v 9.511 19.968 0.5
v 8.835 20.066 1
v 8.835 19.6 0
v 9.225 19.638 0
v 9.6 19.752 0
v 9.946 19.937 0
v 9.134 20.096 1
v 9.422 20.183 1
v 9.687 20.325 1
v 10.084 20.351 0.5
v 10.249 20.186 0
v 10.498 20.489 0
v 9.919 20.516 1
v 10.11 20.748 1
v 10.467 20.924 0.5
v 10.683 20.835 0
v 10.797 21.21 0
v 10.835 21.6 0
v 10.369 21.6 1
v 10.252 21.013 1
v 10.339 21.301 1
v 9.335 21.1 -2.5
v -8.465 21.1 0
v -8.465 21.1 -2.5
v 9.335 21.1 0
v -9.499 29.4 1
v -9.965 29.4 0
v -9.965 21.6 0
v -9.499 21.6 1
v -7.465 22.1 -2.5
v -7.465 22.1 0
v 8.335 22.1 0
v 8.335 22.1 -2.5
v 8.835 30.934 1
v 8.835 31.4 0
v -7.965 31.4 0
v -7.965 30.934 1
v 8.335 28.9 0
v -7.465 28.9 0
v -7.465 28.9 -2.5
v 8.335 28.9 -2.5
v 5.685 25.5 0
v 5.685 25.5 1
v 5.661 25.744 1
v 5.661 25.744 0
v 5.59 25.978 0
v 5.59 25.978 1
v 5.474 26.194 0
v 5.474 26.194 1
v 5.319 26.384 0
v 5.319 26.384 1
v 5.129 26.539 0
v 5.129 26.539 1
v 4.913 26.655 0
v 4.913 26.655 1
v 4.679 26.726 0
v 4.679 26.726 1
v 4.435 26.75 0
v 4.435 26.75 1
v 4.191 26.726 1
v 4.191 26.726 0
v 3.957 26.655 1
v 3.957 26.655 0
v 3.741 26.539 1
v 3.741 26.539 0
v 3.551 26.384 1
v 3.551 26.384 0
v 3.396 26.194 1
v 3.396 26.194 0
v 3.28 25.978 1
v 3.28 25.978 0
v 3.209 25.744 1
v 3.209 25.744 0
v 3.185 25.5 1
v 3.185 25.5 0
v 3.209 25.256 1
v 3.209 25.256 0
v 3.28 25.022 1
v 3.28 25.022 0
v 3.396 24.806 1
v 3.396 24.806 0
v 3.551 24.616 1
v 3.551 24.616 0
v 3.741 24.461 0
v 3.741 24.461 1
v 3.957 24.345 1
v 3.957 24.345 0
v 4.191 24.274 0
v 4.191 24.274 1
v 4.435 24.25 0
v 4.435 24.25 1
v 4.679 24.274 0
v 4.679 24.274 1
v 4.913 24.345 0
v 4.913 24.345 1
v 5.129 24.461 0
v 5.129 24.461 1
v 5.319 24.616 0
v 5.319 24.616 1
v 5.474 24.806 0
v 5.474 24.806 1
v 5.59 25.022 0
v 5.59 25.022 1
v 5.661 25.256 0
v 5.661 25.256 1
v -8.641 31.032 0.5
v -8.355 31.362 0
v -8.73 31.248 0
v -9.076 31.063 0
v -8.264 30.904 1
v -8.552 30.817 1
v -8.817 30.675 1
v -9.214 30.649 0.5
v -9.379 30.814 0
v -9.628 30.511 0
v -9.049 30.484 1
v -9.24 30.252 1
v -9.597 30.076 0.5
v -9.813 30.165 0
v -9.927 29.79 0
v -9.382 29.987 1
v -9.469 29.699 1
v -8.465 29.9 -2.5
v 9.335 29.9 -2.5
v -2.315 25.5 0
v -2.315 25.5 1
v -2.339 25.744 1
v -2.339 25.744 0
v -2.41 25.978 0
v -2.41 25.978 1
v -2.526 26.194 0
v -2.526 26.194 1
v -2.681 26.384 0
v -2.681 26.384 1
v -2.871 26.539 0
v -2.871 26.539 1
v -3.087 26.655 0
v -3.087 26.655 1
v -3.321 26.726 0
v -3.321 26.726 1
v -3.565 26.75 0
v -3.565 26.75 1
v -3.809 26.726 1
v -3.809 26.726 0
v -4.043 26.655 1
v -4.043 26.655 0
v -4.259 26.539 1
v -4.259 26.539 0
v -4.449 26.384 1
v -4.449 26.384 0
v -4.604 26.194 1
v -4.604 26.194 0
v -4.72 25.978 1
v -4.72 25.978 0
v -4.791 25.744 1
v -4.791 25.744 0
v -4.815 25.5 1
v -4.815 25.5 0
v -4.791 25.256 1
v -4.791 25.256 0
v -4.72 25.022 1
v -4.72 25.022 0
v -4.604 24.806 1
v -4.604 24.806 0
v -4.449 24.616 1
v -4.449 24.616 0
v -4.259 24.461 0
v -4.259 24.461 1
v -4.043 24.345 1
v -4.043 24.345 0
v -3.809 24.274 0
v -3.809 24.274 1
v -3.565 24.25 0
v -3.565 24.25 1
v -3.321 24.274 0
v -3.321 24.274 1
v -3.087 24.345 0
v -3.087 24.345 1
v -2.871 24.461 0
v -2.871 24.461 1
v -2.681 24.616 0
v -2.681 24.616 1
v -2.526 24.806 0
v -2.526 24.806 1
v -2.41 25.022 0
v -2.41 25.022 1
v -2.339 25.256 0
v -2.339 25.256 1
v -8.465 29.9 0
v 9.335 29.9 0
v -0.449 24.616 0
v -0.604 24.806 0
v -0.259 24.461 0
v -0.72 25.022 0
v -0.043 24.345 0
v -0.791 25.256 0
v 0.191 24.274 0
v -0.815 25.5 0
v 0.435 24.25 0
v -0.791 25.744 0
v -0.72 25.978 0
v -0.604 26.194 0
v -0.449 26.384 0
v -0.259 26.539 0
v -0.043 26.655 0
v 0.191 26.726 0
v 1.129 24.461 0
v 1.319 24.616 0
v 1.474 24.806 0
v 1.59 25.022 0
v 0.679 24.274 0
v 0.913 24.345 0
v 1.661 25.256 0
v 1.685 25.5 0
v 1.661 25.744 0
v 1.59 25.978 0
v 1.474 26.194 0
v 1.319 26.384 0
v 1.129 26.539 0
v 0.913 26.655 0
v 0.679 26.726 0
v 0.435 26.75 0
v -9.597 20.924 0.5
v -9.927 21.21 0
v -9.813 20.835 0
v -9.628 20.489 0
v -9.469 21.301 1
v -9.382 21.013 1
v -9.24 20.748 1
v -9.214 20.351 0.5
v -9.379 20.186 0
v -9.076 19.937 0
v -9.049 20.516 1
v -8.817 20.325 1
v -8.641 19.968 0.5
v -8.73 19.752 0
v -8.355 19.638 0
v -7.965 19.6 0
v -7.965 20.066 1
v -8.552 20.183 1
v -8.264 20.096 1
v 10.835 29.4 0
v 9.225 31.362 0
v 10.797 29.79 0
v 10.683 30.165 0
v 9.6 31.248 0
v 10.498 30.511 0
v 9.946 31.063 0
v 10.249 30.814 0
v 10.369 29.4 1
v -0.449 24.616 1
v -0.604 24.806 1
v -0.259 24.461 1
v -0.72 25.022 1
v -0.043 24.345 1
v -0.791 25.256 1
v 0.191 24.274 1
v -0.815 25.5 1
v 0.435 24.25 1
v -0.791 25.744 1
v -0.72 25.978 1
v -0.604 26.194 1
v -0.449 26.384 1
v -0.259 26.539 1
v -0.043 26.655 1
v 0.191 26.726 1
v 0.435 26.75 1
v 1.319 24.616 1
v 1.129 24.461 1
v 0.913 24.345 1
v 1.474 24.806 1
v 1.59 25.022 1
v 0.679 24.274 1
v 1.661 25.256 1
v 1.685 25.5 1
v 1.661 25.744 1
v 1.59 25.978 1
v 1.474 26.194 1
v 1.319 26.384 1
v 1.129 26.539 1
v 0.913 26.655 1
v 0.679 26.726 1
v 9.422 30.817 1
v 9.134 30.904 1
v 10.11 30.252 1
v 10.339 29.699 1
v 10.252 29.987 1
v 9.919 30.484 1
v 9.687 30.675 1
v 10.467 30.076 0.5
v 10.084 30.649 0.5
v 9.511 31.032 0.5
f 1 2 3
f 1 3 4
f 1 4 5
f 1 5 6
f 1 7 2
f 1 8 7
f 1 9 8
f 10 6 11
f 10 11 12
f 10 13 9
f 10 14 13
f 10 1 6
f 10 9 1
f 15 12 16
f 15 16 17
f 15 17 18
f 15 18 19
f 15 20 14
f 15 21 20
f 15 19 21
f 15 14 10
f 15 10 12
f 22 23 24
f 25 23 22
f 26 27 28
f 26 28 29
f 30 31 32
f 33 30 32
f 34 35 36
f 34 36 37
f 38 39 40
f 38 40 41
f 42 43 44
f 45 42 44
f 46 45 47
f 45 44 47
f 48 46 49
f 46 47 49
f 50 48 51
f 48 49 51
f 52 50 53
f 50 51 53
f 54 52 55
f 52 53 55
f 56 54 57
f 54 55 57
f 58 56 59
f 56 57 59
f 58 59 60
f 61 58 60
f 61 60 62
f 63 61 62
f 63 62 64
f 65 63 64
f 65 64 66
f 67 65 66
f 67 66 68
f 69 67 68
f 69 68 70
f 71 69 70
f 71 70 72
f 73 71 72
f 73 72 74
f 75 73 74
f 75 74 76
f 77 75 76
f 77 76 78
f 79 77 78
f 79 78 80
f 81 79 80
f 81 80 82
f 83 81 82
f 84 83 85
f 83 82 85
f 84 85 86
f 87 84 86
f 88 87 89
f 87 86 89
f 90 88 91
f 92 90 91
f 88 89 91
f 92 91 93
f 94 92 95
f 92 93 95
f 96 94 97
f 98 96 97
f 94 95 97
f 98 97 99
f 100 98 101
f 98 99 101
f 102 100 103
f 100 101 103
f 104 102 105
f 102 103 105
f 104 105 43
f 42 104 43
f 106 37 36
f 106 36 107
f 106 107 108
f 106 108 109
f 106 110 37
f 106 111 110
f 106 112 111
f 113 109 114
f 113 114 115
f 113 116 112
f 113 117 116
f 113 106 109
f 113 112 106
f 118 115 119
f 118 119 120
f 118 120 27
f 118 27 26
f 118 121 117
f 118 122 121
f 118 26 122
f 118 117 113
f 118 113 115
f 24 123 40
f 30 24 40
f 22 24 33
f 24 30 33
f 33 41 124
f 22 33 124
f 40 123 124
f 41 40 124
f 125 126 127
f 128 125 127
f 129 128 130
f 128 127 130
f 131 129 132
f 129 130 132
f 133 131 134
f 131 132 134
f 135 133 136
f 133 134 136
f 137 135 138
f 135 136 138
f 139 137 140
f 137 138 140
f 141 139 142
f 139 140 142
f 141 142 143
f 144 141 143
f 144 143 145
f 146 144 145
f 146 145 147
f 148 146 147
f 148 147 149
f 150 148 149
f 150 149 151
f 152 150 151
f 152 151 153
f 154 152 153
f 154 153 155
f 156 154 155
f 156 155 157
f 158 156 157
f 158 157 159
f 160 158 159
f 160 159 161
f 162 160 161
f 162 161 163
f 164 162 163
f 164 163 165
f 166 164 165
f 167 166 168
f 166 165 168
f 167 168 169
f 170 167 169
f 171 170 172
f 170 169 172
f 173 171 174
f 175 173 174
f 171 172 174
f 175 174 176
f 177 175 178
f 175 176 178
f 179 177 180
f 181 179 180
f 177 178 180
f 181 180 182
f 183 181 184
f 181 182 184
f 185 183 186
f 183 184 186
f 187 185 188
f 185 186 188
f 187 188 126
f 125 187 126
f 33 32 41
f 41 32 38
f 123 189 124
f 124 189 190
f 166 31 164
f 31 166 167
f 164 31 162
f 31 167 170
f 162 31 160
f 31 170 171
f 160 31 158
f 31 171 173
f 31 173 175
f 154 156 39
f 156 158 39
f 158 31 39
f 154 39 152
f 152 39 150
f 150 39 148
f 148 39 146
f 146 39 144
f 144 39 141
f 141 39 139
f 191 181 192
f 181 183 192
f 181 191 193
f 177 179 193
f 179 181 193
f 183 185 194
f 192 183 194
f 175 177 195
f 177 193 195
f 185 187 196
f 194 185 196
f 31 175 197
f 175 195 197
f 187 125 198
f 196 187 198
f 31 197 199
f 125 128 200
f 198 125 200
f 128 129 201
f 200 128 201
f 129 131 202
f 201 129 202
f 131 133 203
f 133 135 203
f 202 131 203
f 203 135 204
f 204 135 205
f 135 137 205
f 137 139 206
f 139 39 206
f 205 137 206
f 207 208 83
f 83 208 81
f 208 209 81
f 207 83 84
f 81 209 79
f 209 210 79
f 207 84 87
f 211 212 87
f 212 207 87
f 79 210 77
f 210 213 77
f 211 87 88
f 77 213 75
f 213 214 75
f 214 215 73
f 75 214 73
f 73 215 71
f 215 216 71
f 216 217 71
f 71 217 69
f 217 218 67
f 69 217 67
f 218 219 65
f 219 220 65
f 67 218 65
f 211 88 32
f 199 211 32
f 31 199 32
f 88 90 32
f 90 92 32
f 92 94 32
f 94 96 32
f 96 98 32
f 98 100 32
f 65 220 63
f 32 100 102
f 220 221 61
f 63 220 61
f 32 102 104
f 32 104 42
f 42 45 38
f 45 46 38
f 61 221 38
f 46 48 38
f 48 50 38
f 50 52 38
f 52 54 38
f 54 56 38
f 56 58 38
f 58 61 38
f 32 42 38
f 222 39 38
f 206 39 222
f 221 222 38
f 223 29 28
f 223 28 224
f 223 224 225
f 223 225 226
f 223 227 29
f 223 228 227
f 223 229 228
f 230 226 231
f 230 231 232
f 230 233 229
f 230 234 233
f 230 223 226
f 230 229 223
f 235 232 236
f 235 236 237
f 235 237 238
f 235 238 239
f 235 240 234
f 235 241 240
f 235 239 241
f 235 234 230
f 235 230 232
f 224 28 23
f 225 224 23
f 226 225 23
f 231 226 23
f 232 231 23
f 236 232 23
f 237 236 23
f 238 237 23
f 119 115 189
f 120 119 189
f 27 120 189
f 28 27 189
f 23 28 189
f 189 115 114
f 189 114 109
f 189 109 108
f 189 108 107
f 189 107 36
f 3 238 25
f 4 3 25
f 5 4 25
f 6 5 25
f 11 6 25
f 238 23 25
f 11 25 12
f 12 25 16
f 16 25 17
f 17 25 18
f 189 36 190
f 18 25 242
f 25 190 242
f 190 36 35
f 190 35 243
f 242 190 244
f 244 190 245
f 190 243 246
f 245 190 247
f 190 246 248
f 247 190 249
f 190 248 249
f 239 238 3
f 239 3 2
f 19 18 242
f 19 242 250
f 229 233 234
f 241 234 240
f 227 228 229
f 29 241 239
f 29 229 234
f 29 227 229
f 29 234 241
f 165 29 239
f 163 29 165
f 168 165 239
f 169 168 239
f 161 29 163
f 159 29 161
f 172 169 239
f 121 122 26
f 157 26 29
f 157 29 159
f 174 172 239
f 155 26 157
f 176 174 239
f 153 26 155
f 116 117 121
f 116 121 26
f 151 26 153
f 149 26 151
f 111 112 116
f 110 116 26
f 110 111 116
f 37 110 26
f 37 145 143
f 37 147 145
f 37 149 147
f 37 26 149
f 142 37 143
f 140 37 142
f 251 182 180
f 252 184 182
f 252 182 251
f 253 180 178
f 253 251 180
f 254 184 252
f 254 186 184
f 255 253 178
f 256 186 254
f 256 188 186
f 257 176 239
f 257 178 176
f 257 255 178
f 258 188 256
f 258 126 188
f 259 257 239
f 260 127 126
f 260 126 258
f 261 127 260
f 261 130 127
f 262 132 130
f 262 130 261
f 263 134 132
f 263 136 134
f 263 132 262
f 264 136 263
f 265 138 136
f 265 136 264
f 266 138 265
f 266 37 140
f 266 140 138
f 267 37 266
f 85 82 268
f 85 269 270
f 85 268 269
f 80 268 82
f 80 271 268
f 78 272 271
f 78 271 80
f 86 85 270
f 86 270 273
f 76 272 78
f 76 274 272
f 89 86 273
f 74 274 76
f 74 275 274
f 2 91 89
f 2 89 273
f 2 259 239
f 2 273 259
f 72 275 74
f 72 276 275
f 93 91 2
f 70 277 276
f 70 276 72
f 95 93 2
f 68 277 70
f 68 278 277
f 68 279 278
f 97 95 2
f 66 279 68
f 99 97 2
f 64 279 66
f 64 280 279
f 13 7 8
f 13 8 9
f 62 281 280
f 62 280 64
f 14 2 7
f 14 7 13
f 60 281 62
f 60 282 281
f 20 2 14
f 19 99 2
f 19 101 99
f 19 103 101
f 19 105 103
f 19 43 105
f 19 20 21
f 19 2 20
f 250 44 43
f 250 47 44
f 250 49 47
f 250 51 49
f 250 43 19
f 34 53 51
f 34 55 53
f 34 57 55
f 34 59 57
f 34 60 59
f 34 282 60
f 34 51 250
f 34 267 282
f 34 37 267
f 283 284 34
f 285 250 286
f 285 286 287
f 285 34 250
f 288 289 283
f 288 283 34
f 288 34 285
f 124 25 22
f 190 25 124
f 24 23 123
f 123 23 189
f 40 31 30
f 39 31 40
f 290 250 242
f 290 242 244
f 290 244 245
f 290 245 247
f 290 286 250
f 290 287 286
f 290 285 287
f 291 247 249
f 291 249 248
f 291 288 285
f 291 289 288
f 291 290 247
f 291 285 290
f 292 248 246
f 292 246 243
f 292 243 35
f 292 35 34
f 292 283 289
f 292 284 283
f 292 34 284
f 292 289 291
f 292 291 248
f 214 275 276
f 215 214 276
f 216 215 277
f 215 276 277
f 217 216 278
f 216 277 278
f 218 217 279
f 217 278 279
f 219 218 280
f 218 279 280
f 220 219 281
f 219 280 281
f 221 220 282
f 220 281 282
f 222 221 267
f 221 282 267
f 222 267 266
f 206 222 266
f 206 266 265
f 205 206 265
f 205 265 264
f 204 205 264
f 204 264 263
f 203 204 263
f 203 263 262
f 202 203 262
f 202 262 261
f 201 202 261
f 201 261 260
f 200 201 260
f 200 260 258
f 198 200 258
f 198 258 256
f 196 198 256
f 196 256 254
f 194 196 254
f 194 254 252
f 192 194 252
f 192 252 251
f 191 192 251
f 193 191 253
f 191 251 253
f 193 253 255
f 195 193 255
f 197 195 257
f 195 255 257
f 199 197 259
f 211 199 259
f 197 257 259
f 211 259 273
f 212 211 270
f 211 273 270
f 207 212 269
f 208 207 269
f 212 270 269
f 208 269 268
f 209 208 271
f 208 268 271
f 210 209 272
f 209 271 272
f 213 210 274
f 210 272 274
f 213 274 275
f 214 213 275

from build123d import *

# Parameters (mm, degrees)
SKETCH_1_W          = 17.8
SKETCH_1_H          = 8.8
SKETCH_1_W_2        = 15.8
SKETCH_1_H_2        = 6.8
EXTRUDE_1_DEPTH     = 2.5
EXTRUDE_2_DEPTH     = 1
EXTRUDE_2_TAPER     = 25
CUT_EXTRUDE_1_REACH = 5.5
SKETCH_3_R          = 1.25


with BuildPart() as part:
    # 草图1 → 凸台-拉伸1 (new body)
    with BuildSketch(Plane.XY):
        with Locations((0.435, 25.5)):
            Rectangle(SKETCH_1_W, SKETCH_1_H)
        with Locations((0.435, 25.5)):
            Rectangle(SKETCH_1_W_2, SKETCH_1_H_2, mode=Mode.SUBTRACT)
    extrude(amount=-EXTRUDE_1_DEPTH)

    # 草图2 → 凸台-拉伸2 (add)
    with BuildSketch(Plane.XY):
        with BuildLine():
            Line((10.835, 21.6), (10.835, 29.4))
            ThreePointArc((10.835, 29.4), (10.249213562, 30.814213562), (8.835, 31.4))
            Line((8.835, 31.4), (-7.965, 31.4))
            ThreePointArc((-7.965, 31.4), (-9.379213562, 30.814213562), (-9.965, 29.4))
            Line((-9.965, 29.4), (-9.965, 21.6))
            ThreePointArc((-9.965, 21.6), (-9.379213562, 20.185786438), (-7.965, 19.6))
            Line((-7.965, 19.6), (8.835, 19.6))
            ThreePointArc((8.835, 19.6), (10.249213562, 20.185786438), (10.835, 21.6))
        make_face()
    extrude(amount=EXTRUDE_2_DEPTH, taper=EXTRUDE_2_TAPER)

    # 草图3 → 切除-拉伸1 (cut, up to next)
    with BuildSketch(Plane.XY.offset(1), mode=Mode.PRIVATE) as cut_extrude_1_sk1:
        with Locations((0.435, 25.5)):
            Circle(SKETCH_3_R)
    cut_extrude_1_tool1 = extrude(cut_extrude_1_sk1.sketch, amount=-CUT_EXTRUDE_1_REACH, mode=Mode.PRIVATE) & part.part
    add(cut_extrude_1_tool1.solids().sort_by_distance((0.435, 25.5, 1))[0], mode=Mode.SUBTRACT)
    # 草图3 → 切除-拉伸1 (cut, up to next)
    with BuildSketch(Plane.XY.offset(1), mode=Mode.PRIVATE) as cut_extrude_1_sk2:
        with Locations((-3.565, 25.5)):
            Circle(SKETCH_3_R)
    cut_extrude_1_tool2 = extrude(cut_extrude_1_sk2.sketch, amount=-CUT_EXTRUDE_1_REACH, mode=Mode.PRIVATE) & part.part
    add(cut_extrude_1_tool2.solids().sort_by_distance((-3.565, 25.5, 1))[0], mode=Mode.SUBTRACT)
    # 草图3 → 切除-拉伸1 (cut, up to next)
    with BuildSketch(Plane.XY.offset(1), mode=Mode.PRIVATE) as cut_extrude_1_sk3:
        with Locations((4.435, 25.5)):
            Circle(SKETCH_3_R)
    cut_extrude_1_tool3 = extrude(cut_extrude_1_sk3.sketch, amount=-CUT_EXTRUDE_1_REACH, mode=Mode.PRIVATE) & part.part
    add(cut_extrude_1_tool3.solids().sort_by_distance((4.435, 25.5, 1))[0], mode=Mode.SUBTRACT)


solid = part.part
